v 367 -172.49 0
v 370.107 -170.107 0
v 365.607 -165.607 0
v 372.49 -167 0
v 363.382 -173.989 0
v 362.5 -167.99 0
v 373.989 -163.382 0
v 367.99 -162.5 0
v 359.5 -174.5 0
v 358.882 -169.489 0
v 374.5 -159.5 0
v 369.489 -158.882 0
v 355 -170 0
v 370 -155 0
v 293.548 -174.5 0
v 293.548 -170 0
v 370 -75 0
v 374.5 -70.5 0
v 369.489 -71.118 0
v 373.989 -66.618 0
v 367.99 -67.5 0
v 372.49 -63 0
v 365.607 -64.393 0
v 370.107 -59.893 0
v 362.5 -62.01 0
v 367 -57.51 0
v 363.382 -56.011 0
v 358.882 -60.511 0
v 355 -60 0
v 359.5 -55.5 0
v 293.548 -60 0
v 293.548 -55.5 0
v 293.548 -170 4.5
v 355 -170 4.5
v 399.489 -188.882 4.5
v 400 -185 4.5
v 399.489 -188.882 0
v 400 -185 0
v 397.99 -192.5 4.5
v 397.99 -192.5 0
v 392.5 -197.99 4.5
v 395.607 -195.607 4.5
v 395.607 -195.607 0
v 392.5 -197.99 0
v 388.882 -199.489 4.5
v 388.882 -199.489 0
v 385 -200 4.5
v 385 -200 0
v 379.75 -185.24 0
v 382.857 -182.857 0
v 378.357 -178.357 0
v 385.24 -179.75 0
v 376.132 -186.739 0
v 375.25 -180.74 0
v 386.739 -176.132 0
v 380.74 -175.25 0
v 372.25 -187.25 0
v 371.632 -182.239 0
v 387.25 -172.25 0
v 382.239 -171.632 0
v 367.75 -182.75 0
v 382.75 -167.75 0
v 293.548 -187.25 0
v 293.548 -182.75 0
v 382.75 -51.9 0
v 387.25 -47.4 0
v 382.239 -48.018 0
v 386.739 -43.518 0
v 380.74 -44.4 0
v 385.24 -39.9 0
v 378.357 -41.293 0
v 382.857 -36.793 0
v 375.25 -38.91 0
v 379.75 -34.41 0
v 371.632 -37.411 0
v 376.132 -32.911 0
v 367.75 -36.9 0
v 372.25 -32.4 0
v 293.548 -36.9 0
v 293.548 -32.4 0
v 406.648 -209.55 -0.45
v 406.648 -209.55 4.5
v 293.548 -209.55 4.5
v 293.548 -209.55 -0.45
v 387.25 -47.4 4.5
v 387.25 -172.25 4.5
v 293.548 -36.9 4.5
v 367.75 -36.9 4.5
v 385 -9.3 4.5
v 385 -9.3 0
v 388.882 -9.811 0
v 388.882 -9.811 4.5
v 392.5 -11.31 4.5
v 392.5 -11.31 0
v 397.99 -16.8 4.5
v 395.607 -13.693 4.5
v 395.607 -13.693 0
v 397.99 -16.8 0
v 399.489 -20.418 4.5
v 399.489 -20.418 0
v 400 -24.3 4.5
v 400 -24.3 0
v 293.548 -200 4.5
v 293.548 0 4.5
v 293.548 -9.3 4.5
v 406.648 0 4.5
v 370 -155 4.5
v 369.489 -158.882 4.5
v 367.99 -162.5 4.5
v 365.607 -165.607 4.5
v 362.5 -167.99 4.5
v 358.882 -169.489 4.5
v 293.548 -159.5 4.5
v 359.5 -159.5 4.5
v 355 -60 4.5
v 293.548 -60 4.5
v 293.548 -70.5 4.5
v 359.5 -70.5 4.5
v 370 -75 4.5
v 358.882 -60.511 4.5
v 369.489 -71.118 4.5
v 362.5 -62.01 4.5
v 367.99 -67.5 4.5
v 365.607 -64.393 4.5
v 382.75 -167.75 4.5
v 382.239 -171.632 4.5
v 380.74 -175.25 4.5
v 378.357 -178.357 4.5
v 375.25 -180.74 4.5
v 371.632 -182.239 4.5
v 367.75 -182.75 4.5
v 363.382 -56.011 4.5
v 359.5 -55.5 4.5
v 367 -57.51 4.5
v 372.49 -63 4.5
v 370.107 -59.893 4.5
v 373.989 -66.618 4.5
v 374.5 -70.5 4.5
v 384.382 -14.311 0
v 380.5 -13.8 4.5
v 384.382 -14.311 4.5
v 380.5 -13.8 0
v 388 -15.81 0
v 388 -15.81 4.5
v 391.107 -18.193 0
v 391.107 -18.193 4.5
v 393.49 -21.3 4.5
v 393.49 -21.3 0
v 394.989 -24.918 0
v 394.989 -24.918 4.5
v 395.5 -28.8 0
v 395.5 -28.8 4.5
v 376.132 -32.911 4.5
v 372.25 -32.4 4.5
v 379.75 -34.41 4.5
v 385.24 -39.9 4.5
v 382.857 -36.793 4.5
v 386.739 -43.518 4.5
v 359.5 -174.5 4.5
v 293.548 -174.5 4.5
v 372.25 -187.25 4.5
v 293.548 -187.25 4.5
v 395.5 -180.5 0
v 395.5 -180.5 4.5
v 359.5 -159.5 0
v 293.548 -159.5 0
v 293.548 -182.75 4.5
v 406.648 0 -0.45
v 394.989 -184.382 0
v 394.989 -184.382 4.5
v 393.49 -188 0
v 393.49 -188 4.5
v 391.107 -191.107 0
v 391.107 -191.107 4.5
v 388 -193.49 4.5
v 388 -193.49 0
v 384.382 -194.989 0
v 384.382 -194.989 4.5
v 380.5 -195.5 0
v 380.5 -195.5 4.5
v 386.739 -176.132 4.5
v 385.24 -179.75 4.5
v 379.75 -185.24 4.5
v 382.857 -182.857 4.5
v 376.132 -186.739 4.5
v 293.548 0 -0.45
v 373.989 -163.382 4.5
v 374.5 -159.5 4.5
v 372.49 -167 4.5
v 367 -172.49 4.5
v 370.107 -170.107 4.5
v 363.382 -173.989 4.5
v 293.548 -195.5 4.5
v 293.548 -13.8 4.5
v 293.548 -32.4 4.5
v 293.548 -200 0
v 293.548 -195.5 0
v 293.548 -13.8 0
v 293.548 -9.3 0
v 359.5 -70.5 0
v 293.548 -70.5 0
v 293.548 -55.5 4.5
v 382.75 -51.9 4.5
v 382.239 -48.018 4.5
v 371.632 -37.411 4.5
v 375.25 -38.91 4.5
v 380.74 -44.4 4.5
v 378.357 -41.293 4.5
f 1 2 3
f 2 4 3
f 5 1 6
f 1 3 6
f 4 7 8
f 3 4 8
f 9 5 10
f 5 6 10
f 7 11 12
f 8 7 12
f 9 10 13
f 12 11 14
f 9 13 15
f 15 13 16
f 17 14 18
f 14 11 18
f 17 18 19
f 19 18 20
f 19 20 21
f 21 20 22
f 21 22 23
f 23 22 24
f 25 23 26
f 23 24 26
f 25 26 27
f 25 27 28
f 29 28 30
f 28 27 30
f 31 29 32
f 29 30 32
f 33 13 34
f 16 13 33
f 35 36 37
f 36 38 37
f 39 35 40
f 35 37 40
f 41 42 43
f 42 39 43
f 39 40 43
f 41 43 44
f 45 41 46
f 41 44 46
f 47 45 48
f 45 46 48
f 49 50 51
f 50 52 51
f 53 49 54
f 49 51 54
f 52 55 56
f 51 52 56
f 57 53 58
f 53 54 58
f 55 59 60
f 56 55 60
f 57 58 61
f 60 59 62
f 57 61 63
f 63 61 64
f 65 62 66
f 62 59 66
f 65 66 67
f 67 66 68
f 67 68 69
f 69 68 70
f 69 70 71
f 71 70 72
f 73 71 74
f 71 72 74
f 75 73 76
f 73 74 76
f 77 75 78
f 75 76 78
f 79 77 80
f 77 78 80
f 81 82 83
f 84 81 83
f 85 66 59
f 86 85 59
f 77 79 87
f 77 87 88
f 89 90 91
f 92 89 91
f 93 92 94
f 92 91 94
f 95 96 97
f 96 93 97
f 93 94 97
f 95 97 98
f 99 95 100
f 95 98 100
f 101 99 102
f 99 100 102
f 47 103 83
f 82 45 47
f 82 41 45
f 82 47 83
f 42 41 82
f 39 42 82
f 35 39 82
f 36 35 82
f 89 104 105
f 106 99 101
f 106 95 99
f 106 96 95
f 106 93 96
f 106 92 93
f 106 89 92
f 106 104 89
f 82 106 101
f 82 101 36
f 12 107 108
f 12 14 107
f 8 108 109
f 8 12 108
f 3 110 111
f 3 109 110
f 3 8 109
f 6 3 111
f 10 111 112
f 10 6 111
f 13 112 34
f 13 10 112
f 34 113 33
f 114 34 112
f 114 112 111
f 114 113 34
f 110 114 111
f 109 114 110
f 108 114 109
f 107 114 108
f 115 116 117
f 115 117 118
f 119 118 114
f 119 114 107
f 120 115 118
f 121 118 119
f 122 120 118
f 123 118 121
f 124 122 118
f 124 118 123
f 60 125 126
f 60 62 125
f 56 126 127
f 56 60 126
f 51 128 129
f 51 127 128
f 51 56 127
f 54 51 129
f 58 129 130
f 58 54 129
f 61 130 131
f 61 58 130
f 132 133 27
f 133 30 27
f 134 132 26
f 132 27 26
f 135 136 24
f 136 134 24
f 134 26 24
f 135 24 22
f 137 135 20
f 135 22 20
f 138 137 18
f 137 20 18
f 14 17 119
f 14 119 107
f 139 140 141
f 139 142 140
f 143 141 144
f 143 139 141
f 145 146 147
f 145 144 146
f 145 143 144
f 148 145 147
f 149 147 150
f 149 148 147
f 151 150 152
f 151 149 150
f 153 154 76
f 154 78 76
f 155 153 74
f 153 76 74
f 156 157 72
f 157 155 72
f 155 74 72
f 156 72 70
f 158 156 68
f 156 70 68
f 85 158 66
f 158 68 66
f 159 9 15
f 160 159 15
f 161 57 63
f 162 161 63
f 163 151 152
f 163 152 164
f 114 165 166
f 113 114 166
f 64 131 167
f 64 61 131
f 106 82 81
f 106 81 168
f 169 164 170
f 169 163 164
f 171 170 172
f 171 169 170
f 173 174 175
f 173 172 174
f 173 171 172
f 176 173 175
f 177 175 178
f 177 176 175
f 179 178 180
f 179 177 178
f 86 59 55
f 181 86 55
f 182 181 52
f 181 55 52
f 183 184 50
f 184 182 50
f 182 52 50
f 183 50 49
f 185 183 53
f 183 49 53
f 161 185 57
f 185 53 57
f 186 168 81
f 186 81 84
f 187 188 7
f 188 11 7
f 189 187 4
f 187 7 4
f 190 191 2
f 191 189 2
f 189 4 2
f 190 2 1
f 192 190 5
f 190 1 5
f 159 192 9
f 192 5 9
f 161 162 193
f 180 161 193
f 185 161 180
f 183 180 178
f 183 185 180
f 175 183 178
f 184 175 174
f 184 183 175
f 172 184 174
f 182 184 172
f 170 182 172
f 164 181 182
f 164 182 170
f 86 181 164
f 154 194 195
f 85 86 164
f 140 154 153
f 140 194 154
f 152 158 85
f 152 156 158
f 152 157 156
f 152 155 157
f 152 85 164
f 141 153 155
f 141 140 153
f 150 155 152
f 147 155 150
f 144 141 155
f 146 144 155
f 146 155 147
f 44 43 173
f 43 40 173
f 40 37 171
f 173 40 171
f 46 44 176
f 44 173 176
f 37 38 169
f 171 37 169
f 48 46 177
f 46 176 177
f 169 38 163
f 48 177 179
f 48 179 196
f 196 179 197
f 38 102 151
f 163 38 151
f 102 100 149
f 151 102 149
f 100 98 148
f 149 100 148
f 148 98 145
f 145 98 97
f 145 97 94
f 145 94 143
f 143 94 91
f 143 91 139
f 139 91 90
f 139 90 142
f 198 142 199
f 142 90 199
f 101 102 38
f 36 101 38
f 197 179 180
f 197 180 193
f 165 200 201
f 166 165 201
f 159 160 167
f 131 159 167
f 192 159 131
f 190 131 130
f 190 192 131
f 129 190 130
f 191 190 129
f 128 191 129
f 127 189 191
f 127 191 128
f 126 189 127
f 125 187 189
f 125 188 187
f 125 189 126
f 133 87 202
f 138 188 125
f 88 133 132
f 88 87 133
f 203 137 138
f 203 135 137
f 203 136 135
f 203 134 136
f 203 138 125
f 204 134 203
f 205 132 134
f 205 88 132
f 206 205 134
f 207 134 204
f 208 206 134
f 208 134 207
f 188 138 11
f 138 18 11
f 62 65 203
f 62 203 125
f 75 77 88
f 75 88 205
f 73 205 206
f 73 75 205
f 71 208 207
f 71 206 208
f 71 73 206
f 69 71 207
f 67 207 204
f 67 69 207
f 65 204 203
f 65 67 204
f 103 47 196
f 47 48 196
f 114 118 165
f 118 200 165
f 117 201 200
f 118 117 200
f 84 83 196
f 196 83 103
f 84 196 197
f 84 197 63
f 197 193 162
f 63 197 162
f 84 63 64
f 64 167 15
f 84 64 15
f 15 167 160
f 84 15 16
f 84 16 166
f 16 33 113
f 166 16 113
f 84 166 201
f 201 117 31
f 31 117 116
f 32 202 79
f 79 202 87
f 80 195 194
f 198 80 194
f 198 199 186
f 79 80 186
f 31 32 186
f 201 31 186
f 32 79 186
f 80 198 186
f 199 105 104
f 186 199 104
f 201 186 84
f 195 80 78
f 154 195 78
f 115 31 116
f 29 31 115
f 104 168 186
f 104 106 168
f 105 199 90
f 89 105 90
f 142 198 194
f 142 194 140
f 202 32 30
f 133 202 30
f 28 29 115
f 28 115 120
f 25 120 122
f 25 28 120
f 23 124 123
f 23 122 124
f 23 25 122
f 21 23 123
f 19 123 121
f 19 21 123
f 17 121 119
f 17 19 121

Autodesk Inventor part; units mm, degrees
ref_plane "YZ Plane" through (0, 0, 0) normal (1, 0, 0) x (0, 1, 0)
sketch "Sketch1" plane through (0, 0, 0) normal (0, 0, 1) x (1, 0, 0)
  line L0 (0, -9.3) -> (385, -9.3)
  line L1 (400, -24.3) -> (400, -185)
  line L2 (385, -200) -> (-400, -200)
  line L3 (-400, -200) -> (-400, -32.4)
  line L4 (0, -9.3) -> (0, -13.8)
  line L5 (0, -13.8) -> (380.5, -13.8)
  line L6 (395.5, -28.8) -> (395.5, -180.5)
  line L7 (380.5, -195.5) -> (-395.5, -195.5)
  line L8 (-400, -32.4) -> (372.25, -32.4)
  line L9 (387.25, -47.4) -> (387.25, -172.25)
  line L10 (372.25, -187.25) -> (-387.25, -187.25)
  line L11 (-395.5, -195.5) -> (-395.5, -36.9)
  line L12 (-395.5, -36.9) -> (367.75, -36.9)
  line L13 (382.75, -51.9) -> (382.75, -167.75)
  line L14 (367.75, -182.75) -> (-382.75, -182.75)
  line L15 (-382.75, -182.75) -> (-382.75, -60)
  line L16 (-387.25, -187.25) -> (-387.25, -55.5)
  line L17 (-387.25, -55.5) -> (359.5, -55.5)
  line L18 (374.5, -70.5) -> (374.5, -159.5)
  line L19 (-382.75, -60) -> (355, -60)
  line L20 (370, -75) -> (370, -155)
  line L21 (-561.3296, 0) -> (567.9776, 0) projected
  line L22 (355, -170) -> (-374.5, -170)
  line L23 (359.5, -174.5) -> (-374.5, -174.5)
  line L24 (-374.5, -174.5) -> (-374.5, -170)
  arc A0 (400, -24.3) -> (385, -9.3) centre (385, -24.3) ccw
  arc A1 (395.5, -28.8) -> (380.5, -13.8) centre (380.5, -28.8) ccw
  arc A2 (387.25, -47.4) -> (372.25, -32.4) centre (372.25, -47.4) ccw
  arc A3 (382.75, -51.9) -> (367.75, -36.9) centre (367.75, -51.9) ccw
  arc A4 (374.5, -70.5) -> (359.5, -55.5) centre (359.5, -70.5) ccw
  arc A5 (370, -75) -> (355, -60) centre (355, -75) ccw
  arc A6 (355, -170) -> (370, -155) centre (355, -155) ccw
  arc A7 (359.5, -174.5) -> (374.5, -159.5) centre (359.5, -159.5) ccw
  arc A8 (367.75, -182.75) -> (382.75, -167.75) centre (367.75, -167.75) ccw
  arc A9 (372.25, -187.25) -> (387.25, -172.25) centre (372.25, -172.25) ccw
  arc A10 (380.5, -195.5) -> (395.5, -180.5) centre (380.5, -180.5) ccw
  arc A11 (385, -200) -> (400, -185) centre (385, -185) ccw
  line L25 (406.648, 0) -> (293.548, 0)
  line L26 (293.548, 0) -> (293.548, -209.55)
  line L27 (293.548, -209.55) -> (406.648, -209.55)
  line L28 (406.648, -209.55) -> (406.648, 0)
  line L29 (293.548, -70.5) -> (359.5, -70.5)
  line L30 (359.5, -70.5) -> (359.5, -159.5)
  line L31 (359.5, -159.5) -> (293.548, -159.5)
  line L32 (293.548, -159.5) -> (293.548, -70.5)
  point P0 (0, 0)
  point P1 (400, -9.3)
  point P2 (400, -200)
  point P3 (395.5, -13.8)
  point P4 (395.5, -195.5)
  point P5 (387.25, -32.4)
  point P6 (387.25, -187.25)
  point P7 (382.75, -36.9)
  point P8 (382.75, -182.75)
  point P9 (374.5, -55.5)
  point P10 (374.5, -174.5)
  point P11 (370, -60)
  point P12 (370, -170)
  point P13 (0, 0)
  point P14 (293.548, -200)
  point P15 (293.548, 0)
  point P16 (293.548, -9.3)
  point P17 (293.548, -13.8)
  point P18 (293.548, -32.4)
  point P19 (293.548, -187.25)
  point P20 (293.548, -195.5)
  point P21 (293.548, -36.9)
  point P22 (293.548, -55.5)
  point P23 (293.548, -174.5)
  point P24 (293.548, -182.75)
  point P25 (293.548, -60)
  point P26 (293.548, -170)
  dimension "d1" = 4.5
  dimension "d2" = 4.5
  dimension "d3" = 4.5
  dimension "d4" = 9.3
  dimension "d5" = 800
  dimension "d6" = 400
  dimension "d7" = 4.5
  dimension "d8" = 4.5
  dimension "d9" = 8.25
  dimension "d10" = 4.5
  dimension "d11" = 18.6
  dimension "d12" = 4.5
  dimension "d13" = 8.25
  dimension "d14" = 4.5
  dimension "d15" = 4.5
  dimension "d16" = 4.5
  dimension "d17" = 8.25
  dimension "d19" = 18.6
  dimension "d20" = 8.25
  dimension "d82" = 200
  dimension "d88" = 4.5
  dimension "d89" = 8.25
  dimension "d90" = 8.25
  dimension "d91" = 15
  dimension "d100" = 113.1
  dimension "d101" = 209.55
extrude "Extrusion1" add sketch "Sketch1" along normal blind 4.5 contours L26 L21 L28 L27 L2 A11 L1 A0 L0 | L5 A1 L6 A10 L7 L26 L10 A9 L9 A2 L8 | L12 A3 L13 A8 L14 L26 L23 A7 L18 A4 L17 | L19 A5 L20 A6 L22 L26 L31 L30 L29
ref_plane "basePlane" through (0, 0, 0) normal (0, 0, -1) x (-1, 0, 0)
sketch "Sketch5" plane through (0, 0, 0) normal (0, 0, -1) x (-1, 0, 0)
  line L0 (-406.648, 0) -> (-293.548, 0) projected
  line L1 (-406.648, -209.55) -> (-406.648, 0) projected
  line L2 (-293.548, 0) -> (-406.648, 0)
  line L3 (-406.648, 0) -> (-406.648, -209.55)
  line L4 (-406.648, -209.55) -> (-293.548, -209.55)
  line L5 (-293.548, -209.55) -> (-293.548, 0)
  point P0 (0, 0)
extrude "Extrusion5" add sketch "Sketch5" along normal blind 0.45
equation "\"d1\" = wire_diameter"
equation "\"d2\" = wire_diameter"
equation "\"d3\" = wire_diameter"
equation "\"d4\" = 0.5 * distance_between_wires"
equation "\"d5\" = track_length"
equation "\"d6\" = 0.5 * track_length"
equation "\"d7\" = wire_diameter"
equation "\"d8\" = wire_diameter"
equation "\"d9\" = distance_between_wires_edge"
equation "\"d10\" = wire_diameter"
equation "\"d11\" = distance_between_wires"
equation "\"d12\" = wire_diameter"
equation "\"d13\" = distance_between_wires_edge"
equation "\"d14\" = wire_diameter"
equation "\"d15\" = wire_diameter"
equation "\"d16\" = wire_diameter"
equation "\"d17\" = distance_between_wires_edge"
equation "\"d19\" = distance_between_wires"
equation "\"d20\" = distance_between_wires_edge"
equation "\"d82\" = 0.5 * track_width"
equation "\"d22\" = wire_diameter"
equation "\"track_length\" = 800"
equation "\"wire_diameter\" = 4.5"
equation "\"distance_between_wires\" = -1.2 * wire_diameter + 0.2 * parameter_6"
equation "\"distance_between_wires_edge\" = 8.25"
equation "\"bend_radius\" = 15"
equation "\"track_width\" = 400"
equation "\"parameter_6\" = 120"
properties part number "primary_coil_0R2"
